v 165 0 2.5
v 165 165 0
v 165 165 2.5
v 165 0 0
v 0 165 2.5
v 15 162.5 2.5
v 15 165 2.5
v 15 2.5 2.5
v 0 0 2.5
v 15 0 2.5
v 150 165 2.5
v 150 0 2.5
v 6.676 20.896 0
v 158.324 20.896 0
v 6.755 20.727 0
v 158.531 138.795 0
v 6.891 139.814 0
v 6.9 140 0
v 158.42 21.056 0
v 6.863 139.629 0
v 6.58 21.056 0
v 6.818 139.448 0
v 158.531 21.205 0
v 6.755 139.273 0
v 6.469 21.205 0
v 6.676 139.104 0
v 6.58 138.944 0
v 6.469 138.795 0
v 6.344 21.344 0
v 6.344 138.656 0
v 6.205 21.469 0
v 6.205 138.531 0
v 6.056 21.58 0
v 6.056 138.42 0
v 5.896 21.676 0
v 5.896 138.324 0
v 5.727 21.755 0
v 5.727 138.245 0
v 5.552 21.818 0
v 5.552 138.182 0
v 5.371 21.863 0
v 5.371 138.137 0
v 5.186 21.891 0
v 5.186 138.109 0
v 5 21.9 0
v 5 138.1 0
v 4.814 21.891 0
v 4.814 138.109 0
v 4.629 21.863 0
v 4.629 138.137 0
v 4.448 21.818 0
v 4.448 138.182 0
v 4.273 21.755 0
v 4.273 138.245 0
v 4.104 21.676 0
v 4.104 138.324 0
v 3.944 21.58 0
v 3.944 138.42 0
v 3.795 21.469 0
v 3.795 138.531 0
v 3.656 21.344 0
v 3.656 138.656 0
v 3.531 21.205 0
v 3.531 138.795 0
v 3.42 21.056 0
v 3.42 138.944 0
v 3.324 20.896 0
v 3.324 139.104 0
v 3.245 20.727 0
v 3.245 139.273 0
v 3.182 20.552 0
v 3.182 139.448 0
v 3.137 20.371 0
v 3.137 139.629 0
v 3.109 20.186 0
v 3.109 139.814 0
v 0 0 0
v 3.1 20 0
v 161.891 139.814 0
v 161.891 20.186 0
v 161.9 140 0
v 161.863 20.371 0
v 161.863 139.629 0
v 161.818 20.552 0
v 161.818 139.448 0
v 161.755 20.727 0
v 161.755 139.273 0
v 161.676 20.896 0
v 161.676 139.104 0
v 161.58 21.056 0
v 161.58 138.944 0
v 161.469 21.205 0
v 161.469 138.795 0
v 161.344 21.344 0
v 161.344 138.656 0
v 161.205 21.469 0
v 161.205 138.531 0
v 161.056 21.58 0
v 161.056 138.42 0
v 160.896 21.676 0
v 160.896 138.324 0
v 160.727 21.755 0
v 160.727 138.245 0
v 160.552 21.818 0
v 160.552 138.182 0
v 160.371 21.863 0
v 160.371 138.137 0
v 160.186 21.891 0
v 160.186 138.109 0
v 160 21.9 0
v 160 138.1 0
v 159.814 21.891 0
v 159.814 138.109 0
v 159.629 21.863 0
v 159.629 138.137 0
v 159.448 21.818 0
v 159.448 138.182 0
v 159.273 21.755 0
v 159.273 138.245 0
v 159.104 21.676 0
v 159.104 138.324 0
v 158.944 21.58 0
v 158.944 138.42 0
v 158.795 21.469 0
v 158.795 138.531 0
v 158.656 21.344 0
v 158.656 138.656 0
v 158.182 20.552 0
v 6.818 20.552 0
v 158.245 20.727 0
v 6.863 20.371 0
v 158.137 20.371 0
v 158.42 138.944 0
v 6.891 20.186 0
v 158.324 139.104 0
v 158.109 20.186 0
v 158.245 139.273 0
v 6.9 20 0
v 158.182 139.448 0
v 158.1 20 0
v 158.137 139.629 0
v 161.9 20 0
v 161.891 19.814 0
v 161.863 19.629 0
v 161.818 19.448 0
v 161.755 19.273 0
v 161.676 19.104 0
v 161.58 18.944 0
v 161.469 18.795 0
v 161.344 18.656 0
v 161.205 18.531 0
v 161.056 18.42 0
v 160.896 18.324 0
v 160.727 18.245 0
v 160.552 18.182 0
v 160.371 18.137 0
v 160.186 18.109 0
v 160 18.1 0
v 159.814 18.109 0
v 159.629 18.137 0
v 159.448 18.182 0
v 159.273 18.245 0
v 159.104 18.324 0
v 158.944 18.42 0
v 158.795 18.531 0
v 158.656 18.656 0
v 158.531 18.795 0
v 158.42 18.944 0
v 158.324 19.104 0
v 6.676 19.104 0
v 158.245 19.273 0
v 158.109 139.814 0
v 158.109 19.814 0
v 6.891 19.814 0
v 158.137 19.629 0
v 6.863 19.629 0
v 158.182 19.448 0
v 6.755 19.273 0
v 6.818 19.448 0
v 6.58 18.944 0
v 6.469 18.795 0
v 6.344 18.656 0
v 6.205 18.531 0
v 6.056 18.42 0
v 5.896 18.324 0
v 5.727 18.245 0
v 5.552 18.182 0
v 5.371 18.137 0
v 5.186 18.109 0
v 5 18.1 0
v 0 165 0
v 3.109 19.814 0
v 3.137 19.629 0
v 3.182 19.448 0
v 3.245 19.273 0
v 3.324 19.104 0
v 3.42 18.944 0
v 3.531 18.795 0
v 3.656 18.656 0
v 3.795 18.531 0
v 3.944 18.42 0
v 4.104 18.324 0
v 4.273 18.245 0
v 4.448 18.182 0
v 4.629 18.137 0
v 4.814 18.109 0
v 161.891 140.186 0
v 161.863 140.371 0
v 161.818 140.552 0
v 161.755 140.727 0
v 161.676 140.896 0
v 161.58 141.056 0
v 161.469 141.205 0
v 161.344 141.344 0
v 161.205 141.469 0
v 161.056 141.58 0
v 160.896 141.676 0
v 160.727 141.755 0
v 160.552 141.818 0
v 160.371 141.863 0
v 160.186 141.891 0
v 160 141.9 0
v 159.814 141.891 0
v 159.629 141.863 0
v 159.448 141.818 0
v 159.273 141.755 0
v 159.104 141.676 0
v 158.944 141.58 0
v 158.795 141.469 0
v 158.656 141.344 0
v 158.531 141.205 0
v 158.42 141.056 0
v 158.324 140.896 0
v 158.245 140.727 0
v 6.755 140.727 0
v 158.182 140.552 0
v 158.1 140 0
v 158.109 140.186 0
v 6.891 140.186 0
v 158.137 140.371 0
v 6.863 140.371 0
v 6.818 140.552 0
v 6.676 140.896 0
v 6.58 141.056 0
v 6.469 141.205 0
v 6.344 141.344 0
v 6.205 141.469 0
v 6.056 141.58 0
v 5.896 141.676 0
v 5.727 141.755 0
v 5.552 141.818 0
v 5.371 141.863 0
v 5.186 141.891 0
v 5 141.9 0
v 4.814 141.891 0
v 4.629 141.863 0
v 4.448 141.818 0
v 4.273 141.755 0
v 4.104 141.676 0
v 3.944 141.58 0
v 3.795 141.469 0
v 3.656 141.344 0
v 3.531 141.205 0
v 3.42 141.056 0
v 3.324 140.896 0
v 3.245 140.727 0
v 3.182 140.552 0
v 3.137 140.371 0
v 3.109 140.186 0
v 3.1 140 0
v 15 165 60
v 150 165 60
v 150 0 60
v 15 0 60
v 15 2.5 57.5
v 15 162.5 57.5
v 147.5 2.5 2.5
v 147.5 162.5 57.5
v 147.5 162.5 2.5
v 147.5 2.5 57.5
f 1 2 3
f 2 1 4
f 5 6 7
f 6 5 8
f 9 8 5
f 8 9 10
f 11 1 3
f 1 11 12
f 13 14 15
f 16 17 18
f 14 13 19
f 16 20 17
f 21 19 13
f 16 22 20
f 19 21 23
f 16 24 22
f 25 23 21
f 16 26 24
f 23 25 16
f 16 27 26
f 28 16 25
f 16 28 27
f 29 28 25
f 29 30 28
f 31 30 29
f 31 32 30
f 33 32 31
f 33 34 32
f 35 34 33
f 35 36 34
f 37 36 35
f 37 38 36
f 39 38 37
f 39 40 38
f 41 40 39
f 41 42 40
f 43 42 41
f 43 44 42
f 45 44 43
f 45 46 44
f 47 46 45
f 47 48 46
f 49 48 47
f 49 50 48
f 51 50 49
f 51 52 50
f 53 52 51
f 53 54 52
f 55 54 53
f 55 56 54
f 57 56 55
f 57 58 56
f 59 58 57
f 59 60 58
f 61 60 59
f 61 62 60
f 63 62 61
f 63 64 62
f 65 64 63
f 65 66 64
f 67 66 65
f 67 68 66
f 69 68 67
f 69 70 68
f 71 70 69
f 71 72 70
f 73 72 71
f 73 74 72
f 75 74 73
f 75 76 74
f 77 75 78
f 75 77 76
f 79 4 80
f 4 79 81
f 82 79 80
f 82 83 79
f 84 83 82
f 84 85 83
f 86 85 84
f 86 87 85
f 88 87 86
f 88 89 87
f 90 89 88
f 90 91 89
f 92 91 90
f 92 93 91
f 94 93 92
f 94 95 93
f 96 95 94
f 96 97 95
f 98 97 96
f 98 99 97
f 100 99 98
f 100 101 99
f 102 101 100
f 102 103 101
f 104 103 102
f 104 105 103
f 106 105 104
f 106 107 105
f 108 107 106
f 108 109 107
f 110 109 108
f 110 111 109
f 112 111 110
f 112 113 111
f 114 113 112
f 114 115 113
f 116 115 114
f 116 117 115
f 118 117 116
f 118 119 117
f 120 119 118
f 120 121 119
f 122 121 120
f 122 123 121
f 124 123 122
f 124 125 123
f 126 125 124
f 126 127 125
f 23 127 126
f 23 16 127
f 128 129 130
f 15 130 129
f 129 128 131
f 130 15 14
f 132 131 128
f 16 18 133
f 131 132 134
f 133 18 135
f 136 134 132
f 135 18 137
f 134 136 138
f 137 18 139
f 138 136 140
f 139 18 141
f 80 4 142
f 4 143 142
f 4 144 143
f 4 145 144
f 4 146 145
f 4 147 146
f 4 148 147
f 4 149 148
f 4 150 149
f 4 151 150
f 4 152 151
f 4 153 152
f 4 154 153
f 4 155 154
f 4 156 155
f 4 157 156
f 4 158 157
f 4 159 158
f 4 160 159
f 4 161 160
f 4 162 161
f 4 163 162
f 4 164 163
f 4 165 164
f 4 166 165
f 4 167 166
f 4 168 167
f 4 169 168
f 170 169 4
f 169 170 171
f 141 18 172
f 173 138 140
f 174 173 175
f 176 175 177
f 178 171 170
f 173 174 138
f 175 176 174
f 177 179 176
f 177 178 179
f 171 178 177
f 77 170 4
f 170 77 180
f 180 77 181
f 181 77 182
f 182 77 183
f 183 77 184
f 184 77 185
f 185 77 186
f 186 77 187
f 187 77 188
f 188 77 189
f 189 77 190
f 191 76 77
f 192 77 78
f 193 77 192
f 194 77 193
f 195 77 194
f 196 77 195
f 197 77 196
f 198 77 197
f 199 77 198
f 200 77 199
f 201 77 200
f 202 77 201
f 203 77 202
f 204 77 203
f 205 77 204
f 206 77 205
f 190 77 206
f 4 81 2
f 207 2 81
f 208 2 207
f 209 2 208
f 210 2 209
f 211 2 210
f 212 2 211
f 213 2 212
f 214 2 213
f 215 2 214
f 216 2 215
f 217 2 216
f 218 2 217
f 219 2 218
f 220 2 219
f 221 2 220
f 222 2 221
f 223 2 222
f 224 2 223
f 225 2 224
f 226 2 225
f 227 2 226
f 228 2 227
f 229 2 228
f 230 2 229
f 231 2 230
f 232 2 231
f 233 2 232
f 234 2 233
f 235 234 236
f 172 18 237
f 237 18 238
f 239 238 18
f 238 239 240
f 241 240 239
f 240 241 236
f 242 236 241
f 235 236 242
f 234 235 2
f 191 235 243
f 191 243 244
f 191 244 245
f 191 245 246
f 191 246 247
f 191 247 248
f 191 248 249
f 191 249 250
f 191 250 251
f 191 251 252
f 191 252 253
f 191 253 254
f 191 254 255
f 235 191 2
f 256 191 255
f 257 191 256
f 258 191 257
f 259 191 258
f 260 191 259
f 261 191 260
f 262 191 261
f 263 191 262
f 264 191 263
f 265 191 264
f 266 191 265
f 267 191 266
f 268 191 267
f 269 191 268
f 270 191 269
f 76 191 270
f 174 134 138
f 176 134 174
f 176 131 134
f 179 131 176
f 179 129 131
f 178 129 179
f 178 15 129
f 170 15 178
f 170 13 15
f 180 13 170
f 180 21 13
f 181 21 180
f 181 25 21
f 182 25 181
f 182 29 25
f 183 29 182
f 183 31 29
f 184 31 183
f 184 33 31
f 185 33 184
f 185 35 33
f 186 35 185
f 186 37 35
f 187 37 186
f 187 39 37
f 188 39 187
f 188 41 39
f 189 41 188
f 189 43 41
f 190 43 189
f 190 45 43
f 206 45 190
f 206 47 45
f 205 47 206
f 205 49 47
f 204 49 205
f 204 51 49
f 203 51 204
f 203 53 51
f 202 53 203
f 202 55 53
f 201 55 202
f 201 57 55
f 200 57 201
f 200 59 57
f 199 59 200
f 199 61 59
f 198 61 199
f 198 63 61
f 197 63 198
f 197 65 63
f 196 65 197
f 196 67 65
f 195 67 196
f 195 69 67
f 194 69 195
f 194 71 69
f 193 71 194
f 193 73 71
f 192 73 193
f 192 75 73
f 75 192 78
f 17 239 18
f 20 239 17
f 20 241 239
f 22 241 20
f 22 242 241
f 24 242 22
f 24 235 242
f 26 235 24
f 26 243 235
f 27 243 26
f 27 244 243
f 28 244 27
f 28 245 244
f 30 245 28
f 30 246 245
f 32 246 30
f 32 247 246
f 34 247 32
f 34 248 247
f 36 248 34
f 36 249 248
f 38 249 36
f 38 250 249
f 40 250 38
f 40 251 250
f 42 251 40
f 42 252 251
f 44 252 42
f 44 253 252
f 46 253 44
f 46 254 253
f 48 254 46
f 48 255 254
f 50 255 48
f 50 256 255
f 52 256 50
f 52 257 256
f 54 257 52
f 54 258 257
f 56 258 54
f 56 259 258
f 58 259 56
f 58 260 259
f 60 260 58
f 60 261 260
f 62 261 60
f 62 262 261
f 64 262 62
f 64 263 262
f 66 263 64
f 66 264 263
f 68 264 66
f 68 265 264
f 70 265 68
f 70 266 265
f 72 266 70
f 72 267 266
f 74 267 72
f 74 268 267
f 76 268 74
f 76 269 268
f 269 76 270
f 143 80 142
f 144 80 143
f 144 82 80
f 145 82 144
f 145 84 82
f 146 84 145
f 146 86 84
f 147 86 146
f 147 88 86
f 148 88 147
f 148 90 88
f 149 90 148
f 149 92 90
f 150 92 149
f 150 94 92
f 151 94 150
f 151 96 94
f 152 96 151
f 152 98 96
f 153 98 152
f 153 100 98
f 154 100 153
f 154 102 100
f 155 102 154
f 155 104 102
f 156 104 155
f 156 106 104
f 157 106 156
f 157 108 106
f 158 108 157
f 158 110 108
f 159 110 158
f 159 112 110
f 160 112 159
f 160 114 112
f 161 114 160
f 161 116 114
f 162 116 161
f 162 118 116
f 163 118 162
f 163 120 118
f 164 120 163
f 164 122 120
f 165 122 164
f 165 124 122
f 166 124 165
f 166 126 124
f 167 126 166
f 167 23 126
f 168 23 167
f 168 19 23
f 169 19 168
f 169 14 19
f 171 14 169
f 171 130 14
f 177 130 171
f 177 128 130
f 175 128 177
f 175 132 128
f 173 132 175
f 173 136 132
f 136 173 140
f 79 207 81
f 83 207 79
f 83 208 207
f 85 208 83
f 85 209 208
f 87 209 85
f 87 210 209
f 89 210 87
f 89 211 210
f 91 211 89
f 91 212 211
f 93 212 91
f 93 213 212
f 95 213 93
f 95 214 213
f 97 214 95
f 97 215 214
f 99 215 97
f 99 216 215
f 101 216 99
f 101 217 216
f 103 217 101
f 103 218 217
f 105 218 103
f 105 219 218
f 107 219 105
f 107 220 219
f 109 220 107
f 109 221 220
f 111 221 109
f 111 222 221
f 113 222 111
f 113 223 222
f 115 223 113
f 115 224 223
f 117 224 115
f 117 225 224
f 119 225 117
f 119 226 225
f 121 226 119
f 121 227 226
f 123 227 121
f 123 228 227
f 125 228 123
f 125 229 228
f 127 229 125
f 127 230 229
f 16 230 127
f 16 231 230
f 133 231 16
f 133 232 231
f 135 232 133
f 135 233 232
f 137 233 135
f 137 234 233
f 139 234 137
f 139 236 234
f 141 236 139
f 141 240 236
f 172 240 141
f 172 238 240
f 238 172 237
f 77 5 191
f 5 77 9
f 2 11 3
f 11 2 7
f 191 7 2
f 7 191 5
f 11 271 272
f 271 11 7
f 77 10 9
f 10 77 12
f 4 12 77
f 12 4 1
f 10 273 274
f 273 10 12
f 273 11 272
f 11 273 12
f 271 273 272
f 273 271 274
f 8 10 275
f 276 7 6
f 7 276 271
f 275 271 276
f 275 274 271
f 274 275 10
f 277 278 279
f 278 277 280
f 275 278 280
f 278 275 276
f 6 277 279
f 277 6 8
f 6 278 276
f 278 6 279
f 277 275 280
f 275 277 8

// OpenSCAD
// cd stand organizer
// basket
// version 1
// 10.11.2026 Sebastian Weigl
 
// set the fregment sizes
$fn = $preview ? 48 : 64;

// vars
border=2.5;

difference() {
union() {
cube([165,165,2.5],false);

translate([15,0,0])
cube([135,165,60],false);
}
translate([15,2.5,2.5])
#cube([132.5,160,55],false);

#translate([5,20,-1]) rotate([0,0,90]) cylinder(d=3.8,h=10,true);
translate([5,140,-1]) rotate([0,0,90]) cylinder(d=3.8,h=10,true);

#translate([160,20,-1]) rotate([0,0,90]) cylinder(d=3.8,h=10,true);
translate([160,140,-1]) rotate([0,0,90]) cylinder(d=3.8,h=10,true);
} 
